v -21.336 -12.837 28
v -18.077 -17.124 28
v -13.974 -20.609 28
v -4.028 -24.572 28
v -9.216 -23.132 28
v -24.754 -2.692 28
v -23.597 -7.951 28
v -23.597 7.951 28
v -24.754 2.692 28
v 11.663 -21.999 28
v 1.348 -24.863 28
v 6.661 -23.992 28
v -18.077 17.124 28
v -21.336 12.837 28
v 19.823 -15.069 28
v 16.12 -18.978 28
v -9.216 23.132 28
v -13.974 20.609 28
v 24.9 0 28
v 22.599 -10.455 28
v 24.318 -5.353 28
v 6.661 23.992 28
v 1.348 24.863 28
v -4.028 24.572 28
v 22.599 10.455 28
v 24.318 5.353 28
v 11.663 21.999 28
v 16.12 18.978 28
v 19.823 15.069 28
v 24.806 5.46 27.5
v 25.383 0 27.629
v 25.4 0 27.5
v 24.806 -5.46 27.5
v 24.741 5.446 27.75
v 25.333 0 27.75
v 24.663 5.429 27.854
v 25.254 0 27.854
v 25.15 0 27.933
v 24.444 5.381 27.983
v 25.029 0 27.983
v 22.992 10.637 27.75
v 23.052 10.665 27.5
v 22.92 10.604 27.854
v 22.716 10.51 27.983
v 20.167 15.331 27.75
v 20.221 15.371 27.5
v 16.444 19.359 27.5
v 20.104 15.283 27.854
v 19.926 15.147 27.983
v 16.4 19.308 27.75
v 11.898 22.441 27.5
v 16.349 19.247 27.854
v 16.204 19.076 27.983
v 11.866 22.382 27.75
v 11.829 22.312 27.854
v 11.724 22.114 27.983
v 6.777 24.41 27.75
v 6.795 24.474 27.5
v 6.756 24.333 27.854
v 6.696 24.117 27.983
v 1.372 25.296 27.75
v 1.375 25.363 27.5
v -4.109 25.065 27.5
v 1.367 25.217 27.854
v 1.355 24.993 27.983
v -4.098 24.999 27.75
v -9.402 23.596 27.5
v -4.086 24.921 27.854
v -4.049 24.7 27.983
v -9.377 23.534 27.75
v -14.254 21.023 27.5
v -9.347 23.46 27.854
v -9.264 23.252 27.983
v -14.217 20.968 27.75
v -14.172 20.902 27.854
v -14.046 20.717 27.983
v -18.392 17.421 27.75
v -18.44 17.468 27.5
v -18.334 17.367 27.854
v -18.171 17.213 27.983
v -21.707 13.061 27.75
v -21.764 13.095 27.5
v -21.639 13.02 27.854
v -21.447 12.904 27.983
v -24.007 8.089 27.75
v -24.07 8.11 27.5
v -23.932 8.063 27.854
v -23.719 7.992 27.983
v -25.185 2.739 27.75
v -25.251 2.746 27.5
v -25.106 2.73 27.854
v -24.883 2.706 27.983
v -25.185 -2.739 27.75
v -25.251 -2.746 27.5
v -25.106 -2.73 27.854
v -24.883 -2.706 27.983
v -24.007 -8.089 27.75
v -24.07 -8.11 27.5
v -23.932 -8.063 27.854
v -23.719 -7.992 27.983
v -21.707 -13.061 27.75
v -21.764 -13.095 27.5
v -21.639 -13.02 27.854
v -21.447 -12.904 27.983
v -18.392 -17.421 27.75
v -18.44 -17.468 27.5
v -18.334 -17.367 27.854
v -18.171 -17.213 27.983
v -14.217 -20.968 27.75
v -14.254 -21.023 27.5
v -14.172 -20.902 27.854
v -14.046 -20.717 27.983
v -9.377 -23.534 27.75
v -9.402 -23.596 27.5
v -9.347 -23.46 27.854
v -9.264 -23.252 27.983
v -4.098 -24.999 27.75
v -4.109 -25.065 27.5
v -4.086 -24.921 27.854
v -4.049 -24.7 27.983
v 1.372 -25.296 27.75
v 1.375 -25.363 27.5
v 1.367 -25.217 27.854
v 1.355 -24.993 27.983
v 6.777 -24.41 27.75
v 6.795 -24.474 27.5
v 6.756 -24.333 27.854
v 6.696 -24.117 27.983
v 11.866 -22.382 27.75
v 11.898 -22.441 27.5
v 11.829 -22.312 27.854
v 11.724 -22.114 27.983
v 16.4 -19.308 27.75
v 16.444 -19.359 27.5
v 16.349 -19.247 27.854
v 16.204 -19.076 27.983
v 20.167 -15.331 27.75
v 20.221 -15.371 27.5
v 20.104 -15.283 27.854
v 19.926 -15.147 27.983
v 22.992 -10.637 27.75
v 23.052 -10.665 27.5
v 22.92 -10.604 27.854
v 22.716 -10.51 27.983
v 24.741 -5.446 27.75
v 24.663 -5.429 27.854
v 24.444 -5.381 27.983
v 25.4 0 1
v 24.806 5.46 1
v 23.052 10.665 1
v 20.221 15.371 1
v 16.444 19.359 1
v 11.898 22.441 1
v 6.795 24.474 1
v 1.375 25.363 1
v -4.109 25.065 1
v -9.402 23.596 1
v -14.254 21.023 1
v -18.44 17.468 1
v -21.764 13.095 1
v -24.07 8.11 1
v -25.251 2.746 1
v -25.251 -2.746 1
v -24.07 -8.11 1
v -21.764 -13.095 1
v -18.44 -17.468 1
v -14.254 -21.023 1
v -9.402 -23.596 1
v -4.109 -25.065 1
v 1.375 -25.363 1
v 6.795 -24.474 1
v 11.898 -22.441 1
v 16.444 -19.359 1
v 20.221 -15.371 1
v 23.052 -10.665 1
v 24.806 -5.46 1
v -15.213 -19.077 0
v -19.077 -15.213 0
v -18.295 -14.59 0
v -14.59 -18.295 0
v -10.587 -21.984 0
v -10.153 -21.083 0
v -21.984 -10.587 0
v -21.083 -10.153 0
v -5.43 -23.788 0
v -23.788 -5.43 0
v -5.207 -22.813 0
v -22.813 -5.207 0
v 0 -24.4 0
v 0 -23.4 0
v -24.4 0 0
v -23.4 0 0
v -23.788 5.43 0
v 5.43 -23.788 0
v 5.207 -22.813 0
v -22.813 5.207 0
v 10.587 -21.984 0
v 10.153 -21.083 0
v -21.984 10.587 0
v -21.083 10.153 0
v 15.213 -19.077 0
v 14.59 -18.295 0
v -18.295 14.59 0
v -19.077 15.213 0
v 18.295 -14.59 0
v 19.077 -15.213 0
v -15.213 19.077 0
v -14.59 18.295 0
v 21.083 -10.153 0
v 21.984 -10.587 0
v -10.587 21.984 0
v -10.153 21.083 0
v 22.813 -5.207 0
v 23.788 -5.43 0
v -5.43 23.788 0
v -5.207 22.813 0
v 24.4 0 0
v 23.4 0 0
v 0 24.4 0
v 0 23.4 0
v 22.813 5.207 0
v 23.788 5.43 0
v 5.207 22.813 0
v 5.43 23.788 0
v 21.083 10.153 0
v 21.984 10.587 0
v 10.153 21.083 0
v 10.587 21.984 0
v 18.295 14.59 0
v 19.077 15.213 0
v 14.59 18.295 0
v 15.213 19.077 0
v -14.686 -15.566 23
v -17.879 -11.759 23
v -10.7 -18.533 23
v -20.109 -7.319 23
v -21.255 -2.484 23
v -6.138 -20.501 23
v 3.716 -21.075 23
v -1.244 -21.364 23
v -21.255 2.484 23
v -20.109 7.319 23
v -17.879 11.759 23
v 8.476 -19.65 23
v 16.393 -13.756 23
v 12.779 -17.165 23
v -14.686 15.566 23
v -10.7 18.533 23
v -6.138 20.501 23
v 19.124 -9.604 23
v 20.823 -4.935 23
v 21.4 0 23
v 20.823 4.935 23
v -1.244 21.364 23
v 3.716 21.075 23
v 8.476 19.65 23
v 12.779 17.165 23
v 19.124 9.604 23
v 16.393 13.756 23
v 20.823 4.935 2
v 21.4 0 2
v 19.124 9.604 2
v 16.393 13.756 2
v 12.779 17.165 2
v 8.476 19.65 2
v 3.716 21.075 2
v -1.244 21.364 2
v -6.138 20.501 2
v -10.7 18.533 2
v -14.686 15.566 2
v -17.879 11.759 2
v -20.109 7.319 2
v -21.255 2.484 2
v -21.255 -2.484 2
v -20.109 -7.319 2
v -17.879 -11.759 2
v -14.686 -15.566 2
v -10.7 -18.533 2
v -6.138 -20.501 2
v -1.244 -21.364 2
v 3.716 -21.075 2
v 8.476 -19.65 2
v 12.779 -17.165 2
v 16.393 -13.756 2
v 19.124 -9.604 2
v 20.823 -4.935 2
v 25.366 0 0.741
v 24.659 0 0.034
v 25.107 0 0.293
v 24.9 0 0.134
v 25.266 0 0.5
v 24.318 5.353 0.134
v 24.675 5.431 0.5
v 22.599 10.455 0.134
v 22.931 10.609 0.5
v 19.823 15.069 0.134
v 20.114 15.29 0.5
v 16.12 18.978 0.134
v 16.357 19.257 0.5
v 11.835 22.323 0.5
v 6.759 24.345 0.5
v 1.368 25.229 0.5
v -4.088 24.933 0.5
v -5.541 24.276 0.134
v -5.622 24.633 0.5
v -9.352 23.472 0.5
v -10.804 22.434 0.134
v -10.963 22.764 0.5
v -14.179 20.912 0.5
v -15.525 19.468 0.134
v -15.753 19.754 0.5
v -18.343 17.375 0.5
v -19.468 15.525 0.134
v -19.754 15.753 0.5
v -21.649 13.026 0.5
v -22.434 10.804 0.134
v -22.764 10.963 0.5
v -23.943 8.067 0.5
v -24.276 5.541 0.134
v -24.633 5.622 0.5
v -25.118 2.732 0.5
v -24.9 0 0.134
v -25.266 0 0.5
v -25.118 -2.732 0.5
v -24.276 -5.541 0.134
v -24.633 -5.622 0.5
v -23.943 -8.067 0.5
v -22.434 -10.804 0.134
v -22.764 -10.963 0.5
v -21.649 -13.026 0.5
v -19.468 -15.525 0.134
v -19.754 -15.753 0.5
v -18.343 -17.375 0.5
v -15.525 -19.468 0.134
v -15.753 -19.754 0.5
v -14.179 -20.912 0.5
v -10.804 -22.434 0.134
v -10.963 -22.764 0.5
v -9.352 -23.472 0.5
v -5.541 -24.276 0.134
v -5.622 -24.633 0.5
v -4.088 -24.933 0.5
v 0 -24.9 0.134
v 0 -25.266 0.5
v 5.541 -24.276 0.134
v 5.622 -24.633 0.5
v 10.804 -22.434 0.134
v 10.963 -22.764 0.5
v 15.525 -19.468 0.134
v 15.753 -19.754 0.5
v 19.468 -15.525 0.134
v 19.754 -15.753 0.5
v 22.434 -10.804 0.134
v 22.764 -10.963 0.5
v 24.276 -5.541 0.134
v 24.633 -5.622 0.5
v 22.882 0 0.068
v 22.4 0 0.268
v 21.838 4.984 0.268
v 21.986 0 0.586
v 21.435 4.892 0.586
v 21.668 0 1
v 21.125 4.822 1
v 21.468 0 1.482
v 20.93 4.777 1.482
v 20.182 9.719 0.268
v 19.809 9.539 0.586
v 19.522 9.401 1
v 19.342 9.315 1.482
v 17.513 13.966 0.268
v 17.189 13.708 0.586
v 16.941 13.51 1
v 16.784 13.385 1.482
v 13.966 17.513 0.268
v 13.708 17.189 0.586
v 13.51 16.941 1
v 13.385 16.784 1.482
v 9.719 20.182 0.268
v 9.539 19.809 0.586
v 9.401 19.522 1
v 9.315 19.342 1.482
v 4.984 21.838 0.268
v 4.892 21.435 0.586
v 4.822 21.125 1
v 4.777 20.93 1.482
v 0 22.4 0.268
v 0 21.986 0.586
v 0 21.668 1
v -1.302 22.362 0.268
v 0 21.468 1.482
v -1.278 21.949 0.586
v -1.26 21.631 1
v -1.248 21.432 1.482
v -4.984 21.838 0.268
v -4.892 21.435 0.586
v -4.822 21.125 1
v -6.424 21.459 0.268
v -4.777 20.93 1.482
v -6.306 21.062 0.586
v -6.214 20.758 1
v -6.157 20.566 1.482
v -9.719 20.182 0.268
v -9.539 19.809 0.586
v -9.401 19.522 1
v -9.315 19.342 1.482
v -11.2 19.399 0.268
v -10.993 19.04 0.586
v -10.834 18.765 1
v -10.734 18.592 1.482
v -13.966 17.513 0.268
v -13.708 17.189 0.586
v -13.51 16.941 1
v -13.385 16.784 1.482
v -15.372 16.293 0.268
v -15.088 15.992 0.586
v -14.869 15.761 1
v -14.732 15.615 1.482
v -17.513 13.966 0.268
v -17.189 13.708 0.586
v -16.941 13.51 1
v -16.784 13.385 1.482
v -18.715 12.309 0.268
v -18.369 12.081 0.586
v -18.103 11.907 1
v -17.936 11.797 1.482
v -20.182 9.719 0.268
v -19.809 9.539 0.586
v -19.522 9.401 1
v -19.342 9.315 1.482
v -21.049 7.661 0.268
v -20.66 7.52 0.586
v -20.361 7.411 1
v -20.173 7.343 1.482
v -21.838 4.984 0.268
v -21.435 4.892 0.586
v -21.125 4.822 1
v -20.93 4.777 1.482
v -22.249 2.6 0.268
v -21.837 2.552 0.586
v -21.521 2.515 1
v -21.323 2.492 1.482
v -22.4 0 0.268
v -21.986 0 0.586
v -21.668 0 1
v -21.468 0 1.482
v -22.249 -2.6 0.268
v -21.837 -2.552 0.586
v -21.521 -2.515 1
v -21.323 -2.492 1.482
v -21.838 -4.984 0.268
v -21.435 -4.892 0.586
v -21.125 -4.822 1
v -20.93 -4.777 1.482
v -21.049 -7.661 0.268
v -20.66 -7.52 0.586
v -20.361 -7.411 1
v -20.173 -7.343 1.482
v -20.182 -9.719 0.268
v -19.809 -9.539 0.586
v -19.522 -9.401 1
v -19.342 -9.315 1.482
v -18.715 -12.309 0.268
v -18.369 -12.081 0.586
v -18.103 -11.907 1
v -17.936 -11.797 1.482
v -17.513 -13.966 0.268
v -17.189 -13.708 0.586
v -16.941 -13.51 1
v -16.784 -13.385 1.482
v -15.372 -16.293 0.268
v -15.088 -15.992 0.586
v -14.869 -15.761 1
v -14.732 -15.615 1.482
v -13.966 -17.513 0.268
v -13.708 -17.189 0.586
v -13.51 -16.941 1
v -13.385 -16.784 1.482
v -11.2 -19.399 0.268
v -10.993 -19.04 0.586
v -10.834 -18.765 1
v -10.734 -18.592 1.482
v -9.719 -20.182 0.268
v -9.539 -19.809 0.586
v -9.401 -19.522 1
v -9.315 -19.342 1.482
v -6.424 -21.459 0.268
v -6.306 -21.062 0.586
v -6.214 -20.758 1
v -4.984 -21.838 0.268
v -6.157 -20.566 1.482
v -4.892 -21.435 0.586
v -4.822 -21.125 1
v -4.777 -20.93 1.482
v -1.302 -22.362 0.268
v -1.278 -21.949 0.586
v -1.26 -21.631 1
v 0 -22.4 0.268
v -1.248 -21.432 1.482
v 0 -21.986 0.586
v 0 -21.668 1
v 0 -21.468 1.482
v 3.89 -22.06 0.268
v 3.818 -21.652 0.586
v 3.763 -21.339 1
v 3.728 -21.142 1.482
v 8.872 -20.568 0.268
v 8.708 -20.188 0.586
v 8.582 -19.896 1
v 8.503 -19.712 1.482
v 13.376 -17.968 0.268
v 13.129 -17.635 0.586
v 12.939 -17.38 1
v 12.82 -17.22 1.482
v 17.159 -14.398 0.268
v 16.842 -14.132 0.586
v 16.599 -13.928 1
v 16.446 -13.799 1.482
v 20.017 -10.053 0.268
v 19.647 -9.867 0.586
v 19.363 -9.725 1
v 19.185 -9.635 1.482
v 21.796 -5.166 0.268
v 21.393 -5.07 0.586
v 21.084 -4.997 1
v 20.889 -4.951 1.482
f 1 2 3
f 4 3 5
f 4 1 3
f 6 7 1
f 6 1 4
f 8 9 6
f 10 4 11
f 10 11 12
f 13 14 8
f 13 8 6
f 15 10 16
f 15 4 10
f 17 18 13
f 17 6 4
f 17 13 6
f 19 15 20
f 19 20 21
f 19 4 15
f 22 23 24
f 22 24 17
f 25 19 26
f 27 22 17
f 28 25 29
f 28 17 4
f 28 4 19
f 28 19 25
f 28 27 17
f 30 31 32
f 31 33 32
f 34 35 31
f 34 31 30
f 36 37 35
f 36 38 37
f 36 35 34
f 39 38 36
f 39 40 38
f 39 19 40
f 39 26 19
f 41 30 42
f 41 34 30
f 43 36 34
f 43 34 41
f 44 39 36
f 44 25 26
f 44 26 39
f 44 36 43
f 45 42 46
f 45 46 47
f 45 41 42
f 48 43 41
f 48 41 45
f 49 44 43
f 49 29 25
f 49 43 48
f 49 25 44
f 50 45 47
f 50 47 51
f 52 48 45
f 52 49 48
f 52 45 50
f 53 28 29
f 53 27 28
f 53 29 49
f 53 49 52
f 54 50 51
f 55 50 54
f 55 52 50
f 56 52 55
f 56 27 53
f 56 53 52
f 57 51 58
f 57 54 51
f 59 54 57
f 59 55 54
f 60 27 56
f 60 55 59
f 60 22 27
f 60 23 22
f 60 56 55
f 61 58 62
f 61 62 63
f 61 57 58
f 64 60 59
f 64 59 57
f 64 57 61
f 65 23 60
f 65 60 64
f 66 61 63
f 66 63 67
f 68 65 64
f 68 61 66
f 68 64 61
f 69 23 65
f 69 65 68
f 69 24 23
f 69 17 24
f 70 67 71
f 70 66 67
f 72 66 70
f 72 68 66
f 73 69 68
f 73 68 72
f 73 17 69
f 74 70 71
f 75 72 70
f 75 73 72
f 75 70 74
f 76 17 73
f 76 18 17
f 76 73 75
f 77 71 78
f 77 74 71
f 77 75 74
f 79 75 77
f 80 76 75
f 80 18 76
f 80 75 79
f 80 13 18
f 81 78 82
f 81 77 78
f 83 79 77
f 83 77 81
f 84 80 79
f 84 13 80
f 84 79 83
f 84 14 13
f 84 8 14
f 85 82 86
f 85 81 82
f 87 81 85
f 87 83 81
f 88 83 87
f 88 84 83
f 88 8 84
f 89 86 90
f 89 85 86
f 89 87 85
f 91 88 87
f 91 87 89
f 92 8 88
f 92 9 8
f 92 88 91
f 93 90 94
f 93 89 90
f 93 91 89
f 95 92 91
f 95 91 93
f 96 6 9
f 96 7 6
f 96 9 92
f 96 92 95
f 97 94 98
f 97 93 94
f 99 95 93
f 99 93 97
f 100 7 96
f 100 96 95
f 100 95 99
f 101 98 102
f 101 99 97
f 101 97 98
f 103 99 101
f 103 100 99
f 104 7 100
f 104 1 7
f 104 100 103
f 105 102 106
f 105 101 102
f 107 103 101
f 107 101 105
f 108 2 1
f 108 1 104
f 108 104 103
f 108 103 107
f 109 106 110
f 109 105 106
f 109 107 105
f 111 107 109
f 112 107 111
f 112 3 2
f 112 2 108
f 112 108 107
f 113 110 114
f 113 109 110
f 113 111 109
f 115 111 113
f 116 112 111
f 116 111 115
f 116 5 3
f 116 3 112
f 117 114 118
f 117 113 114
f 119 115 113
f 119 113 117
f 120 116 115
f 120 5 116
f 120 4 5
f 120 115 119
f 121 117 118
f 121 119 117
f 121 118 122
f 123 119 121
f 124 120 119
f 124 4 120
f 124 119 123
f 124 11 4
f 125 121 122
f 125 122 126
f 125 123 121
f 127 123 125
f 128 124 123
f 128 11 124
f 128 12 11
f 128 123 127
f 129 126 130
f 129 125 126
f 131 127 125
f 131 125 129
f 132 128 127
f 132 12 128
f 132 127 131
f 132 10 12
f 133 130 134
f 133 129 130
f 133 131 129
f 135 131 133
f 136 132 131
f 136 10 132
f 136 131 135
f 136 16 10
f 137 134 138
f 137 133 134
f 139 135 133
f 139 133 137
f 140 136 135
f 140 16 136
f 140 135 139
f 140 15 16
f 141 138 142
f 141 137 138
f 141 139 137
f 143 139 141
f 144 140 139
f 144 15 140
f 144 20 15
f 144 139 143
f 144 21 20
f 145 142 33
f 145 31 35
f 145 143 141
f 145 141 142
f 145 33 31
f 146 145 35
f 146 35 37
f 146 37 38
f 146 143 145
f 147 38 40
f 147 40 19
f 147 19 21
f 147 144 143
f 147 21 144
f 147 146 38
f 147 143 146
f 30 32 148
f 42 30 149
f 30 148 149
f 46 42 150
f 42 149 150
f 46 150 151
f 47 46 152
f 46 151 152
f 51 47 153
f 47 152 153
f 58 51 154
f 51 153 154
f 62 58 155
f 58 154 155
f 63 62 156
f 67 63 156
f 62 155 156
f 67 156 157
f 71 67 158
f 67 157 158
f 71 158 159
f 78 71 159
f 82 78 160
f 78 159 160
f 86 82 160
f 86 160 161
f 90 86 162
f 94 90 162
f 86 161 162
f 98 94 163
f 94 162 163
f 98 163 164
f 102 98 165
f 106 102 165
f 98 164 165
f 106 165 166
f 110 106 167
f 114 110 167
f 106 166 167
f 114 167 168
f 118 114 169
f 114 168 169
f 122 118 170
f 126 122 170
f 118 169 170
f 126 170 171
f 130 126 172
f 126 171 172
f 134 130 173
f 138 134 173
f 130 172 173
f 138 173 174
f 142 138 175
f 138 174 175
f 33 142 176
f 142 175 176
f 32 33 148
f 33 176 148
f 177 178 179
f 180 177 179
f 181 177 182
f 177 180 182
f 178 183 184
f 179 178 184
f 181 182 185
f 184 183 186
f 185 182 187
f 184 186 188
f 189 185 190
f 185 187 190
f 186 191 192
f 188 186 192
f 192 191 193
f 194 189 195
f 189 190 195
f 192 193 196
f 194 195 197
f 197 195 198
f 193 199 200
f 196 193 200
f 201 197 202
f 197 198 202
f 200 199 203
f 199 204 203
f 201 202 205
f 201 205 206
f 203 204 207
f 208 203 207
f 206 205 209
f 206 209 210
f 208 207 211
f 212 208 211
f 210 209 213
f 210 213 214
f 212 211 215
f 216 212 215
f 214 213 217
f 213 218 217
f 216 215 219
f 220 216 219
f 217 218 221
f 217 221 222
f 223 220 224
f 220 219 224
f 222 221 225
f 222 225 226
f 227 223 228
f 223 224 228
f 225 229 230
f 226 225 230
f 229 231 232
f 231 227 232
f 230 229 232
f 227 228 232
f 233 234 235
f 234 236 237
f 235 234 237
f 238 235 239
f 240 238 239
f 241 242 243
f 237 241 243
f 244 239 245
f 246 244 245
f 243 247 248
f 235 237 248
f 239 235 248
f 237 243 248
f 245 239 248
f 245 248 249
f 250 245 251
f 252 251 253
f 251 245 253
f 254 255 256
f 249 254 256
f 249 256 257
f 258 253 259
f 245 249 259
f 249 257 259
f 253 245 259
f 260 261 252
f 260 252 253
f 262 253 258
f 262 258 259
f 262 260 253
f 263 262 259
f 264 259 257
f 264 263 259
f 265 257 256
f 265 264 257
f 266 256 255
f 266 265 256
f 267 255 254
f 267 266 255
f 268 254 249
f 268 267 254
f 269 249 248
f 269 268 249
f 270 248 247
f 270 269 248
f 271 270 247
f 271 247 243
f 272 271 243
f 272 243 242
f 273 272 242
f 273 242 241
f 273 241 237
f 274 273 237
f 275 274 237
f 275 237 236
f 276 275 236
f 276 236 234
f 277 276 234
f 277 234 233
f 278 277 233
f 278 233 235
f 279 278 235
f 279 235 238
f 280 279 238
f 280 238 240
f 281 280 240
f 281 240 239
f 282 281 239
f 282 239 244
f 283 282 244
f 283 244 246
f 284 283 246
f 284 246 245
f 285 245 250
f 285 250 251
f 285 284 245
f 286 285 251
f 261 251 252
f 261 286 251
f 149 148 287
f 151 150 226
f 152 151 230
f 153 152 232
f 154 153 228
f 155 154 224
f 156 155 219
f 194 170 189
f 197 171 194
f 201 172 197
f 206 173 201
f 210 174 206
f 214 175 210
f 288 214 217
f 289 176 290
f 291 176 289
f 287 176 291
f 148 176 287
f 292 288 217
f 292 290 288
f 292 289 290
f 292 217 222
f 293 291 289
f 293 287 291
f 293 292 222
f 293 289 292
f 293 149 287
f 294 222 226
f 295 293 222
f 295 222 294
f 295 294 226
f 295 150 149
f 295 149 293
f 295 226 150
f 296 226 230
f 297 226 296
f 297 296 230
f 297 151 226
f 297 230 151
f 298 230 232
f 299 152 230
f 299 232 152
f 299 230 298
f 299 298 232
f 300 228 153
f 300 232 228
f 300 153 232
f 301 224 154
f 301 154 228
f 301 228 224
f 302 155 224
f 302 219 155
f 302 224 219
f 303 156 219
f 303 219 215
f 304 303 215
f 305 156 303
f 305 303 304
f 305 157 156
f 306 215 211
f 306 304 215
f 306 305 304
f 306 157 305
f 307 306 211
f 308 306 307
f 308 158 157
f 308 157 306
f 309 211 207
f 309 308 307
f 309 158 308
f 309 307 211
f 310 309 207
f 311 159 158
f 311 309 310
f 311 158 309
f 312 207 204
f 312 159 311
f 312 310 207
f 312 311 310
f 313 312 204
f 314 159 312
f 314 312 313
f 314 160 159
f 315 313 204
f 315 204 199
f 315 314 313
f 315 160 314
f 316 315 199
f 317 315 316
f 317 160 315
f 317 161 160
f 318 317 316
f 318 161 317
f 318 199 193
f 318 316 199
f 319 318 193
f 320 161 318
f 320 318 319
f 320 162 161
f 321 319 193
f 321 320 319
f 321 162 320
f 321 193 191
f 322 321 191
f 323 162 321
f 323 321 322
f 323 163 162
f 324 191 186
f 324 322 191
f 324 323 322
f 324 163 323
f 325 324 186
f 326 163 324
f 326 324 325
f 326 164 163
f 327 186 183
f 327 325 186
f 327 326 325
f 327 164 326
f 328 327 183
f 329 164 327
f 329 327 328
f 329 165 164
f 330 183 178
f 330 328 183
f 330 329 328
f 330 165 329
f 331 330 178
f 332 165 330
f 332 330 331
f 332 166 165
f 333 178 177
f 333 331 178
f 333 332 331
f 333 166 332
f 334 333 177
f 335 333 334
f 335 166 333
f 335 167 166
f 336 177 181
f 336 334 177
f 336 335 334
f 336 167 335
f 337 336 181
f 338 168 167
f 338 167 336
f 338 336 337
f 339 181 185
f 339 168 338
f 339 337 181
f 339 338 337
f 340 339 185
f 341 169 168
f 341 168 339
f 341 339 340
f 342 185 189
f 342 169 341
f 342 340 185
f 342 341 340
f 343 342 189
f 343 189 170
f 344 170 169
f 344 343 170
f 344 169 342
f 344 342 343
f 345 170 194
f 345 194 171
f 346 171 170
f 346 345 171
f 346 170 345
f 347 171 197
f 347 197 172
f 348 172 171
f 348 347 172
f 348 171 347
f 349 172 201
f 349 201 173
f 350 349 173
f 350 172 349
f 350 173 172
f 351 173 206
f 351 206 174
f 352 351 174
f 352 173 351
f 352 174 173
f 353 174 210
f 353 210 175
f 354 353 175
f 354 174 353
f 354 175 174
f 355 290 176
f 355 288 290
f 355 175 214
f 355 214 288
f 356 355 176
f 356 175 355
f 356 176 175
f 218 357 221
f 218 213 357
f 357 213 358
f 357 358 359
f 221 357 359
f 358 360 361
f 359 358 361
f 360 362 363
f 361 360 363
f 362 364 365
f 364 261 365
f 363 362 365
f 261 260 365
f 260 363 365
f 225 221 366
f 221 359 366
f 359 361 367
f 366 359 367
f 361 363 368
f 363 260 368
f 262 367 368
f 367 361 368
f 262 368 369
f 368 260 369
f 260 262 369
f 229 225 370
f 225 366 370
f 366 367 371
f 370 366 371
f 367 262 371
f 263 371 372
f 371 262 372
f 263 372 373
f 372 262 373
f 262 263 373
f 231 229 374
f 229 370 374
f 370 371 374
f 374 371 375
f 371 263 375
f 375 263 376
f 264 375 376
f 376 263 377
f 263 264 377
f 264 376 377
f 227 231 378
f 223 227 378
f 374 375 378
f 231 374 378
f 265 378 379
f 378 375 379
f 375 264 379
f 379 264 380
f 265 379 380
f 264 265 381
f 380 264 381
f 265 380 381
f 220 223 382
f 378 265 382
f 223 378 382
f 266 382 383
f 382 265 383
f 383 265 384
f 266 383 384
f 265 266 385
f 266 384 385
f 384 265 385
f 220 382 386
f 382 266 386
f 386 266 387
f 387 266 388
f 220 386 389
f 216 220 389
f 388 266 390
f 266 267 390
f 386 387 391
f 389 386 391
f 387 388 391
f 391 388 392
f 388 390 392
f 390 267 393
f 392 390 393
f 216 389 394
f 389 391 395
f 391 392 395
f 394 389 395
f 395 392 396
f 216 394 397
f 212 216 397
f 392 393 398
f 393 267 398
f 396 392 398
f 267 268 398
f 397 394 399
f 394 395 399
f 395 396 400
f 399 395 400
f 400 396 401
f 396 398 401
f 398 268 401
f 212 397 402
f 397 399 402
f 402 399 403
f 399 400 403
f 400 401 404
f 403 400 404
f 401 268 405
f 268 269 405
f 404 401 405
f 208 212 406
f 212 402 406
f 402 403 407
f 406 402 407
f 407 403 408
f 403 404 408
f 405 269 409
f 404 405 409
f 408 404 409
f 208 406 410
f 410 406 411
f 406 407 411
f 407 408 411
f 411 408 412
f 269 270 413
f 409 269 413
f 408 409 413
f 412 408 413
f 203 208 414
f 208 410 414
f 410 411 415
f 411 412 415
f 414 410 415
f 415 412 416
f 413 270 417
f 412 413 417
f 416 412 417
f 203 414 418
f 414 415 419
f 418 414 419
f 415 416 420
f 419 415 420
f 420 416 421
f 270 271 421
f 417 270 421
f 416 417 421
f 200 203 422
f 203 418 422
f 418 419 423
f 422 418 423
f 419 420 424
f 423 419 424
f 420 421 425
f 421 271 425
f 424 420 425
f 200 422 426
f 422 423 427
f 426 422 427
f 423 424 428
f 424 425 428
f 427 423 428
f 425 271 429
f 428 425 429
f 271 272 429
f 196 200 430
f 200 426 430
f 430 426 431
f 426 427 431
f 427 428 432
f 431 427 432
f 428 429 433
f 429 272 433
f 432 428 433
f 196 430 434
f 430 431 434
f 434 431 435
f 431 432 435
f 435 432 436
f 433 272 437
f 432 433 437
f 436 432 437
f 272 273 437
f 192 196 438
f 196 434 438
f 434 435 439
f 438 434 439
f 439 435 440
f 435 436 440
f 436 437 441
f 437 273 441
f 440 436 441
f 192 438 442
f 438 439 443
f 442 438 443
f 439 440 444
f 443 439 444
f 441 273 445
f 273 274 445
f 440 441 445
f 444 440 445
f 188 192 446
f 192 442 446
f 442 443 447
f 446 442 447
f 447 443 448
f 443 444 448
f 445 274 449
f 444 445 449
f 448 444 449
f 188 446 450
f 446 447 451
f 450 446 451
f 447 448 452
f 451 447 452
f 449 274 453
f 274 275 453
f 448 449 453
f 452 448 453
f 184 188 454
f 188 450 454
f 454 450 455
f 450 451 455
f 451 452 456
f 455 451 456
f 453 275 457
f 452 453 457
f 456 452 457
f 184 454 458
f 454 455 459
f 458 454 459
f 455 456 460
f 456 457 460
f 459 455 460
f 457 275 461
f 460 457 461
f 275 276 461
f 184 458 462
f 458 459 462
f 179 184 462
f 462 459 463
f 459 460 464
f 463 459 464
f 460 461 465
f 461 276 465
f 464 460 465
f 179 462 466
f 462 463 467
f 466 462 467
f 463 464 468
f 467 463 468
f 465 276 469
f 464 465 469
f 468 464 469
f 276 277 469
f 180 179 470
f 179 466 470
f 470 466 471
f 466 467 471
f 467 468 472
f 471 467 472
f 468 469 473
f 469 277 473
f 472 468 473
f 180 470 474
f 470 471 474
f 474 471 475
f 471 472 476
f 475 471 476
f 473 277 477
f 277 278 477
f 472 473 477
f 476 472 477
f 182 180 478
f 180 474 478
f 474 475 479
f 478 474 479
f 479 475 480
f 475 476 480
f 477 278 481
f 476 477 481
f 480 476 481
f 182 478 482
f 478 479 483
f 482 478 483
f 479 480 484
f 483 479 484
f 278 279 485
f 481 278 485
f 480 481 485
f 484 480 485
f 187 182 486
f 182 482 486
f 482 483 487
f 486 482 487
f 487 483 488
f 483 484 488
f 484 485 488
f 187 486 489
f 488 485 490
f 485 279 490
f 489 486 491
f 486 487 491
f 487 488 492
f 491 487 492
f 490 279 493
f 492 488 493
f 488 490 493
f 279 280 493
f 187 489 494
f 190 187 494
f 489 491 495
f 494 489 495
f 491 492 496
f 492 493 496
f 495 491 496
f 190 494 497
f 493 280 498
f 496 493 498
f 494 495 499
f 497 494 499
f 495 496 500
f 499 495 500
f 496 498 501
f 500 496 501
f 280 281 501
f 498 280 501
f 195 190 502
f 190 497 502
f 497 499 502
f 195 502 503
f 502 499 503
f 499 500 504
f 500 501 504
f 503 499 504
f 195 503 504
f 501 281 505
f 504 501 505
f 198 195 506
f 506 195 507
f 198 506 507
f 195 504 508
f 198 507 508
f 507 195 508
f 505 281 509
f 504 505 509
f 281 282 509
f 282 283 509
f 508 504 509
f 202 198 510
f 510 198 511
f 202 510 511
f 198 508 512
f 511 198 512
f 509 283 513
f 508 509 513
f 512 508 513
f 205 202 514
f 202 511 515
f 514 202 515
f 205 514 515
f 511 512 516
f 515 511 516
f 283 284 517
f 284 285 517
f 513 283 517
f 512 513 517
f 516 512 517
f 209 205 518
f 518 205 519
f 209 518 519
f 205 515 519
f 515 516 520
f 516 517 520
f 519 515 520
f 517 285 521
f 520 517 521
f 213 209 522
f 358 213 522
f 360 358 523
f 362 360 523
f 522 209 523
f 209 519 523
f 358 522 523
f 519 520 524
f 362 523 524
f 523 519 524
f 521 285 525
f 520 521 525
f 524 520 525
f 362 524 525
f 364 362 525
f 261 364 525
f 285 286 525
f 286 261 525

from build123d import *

# Parameters (mm, degrees)
SKETCH1_R           = 25.4
SKETCH1_R_2         = 21.4
BOSS_EXTRUDE1_DEPTH = 28
SKETCH2_R           = 21.4
BOSS_EXTRUDE3_DEPTH = 5
FILLET3_R           = 2
FILLET4_R           = 1
FILLET5_R           = 0.5


with BuildPart() as part:
    # Sketch1 → Boss-Extrude1 (new body)
    with BuildSketch(Plane.XY):
        Circle(SKETCH1_R)
        Circle(SKETCH1_R_2, mode=Mode.SUBTRACT)
    extrude(amount=BOSS_EXTRUDE1_DEPTH)

    # Sketch2 → Boss-Extrude3 (add)
    with BuildSketch(Plane.XY.offset(28)):
        Circle(SKETCH2_R)
    extrude(amount=-BOSS_EXTRUDE3_DEPTH)

    # Fillet3
    fillet3_edges = [part.edges().sort_by_distance(p)[0] for p in [
        (-21.4, 0, 0),
    ]]
    fillet(fillet3_edges, radius=FILLET3_R)

    # Fillet4
    fillet4_edges = [part.edges().sort_by_distance(p)[0] for p in [
        (-25.4, 0, 0),
    ]]
    fillet(fillet4_edges, radius=FILLET4_R)

    # Fillet5
    fillet5_edges = [part.edges().sort_by_distance(p)[0] for p in [
        (-25.4, 0, 28),
    ]]
    fillet(fillet5_edges, radius=FILLET5_R)


solid = part.part
